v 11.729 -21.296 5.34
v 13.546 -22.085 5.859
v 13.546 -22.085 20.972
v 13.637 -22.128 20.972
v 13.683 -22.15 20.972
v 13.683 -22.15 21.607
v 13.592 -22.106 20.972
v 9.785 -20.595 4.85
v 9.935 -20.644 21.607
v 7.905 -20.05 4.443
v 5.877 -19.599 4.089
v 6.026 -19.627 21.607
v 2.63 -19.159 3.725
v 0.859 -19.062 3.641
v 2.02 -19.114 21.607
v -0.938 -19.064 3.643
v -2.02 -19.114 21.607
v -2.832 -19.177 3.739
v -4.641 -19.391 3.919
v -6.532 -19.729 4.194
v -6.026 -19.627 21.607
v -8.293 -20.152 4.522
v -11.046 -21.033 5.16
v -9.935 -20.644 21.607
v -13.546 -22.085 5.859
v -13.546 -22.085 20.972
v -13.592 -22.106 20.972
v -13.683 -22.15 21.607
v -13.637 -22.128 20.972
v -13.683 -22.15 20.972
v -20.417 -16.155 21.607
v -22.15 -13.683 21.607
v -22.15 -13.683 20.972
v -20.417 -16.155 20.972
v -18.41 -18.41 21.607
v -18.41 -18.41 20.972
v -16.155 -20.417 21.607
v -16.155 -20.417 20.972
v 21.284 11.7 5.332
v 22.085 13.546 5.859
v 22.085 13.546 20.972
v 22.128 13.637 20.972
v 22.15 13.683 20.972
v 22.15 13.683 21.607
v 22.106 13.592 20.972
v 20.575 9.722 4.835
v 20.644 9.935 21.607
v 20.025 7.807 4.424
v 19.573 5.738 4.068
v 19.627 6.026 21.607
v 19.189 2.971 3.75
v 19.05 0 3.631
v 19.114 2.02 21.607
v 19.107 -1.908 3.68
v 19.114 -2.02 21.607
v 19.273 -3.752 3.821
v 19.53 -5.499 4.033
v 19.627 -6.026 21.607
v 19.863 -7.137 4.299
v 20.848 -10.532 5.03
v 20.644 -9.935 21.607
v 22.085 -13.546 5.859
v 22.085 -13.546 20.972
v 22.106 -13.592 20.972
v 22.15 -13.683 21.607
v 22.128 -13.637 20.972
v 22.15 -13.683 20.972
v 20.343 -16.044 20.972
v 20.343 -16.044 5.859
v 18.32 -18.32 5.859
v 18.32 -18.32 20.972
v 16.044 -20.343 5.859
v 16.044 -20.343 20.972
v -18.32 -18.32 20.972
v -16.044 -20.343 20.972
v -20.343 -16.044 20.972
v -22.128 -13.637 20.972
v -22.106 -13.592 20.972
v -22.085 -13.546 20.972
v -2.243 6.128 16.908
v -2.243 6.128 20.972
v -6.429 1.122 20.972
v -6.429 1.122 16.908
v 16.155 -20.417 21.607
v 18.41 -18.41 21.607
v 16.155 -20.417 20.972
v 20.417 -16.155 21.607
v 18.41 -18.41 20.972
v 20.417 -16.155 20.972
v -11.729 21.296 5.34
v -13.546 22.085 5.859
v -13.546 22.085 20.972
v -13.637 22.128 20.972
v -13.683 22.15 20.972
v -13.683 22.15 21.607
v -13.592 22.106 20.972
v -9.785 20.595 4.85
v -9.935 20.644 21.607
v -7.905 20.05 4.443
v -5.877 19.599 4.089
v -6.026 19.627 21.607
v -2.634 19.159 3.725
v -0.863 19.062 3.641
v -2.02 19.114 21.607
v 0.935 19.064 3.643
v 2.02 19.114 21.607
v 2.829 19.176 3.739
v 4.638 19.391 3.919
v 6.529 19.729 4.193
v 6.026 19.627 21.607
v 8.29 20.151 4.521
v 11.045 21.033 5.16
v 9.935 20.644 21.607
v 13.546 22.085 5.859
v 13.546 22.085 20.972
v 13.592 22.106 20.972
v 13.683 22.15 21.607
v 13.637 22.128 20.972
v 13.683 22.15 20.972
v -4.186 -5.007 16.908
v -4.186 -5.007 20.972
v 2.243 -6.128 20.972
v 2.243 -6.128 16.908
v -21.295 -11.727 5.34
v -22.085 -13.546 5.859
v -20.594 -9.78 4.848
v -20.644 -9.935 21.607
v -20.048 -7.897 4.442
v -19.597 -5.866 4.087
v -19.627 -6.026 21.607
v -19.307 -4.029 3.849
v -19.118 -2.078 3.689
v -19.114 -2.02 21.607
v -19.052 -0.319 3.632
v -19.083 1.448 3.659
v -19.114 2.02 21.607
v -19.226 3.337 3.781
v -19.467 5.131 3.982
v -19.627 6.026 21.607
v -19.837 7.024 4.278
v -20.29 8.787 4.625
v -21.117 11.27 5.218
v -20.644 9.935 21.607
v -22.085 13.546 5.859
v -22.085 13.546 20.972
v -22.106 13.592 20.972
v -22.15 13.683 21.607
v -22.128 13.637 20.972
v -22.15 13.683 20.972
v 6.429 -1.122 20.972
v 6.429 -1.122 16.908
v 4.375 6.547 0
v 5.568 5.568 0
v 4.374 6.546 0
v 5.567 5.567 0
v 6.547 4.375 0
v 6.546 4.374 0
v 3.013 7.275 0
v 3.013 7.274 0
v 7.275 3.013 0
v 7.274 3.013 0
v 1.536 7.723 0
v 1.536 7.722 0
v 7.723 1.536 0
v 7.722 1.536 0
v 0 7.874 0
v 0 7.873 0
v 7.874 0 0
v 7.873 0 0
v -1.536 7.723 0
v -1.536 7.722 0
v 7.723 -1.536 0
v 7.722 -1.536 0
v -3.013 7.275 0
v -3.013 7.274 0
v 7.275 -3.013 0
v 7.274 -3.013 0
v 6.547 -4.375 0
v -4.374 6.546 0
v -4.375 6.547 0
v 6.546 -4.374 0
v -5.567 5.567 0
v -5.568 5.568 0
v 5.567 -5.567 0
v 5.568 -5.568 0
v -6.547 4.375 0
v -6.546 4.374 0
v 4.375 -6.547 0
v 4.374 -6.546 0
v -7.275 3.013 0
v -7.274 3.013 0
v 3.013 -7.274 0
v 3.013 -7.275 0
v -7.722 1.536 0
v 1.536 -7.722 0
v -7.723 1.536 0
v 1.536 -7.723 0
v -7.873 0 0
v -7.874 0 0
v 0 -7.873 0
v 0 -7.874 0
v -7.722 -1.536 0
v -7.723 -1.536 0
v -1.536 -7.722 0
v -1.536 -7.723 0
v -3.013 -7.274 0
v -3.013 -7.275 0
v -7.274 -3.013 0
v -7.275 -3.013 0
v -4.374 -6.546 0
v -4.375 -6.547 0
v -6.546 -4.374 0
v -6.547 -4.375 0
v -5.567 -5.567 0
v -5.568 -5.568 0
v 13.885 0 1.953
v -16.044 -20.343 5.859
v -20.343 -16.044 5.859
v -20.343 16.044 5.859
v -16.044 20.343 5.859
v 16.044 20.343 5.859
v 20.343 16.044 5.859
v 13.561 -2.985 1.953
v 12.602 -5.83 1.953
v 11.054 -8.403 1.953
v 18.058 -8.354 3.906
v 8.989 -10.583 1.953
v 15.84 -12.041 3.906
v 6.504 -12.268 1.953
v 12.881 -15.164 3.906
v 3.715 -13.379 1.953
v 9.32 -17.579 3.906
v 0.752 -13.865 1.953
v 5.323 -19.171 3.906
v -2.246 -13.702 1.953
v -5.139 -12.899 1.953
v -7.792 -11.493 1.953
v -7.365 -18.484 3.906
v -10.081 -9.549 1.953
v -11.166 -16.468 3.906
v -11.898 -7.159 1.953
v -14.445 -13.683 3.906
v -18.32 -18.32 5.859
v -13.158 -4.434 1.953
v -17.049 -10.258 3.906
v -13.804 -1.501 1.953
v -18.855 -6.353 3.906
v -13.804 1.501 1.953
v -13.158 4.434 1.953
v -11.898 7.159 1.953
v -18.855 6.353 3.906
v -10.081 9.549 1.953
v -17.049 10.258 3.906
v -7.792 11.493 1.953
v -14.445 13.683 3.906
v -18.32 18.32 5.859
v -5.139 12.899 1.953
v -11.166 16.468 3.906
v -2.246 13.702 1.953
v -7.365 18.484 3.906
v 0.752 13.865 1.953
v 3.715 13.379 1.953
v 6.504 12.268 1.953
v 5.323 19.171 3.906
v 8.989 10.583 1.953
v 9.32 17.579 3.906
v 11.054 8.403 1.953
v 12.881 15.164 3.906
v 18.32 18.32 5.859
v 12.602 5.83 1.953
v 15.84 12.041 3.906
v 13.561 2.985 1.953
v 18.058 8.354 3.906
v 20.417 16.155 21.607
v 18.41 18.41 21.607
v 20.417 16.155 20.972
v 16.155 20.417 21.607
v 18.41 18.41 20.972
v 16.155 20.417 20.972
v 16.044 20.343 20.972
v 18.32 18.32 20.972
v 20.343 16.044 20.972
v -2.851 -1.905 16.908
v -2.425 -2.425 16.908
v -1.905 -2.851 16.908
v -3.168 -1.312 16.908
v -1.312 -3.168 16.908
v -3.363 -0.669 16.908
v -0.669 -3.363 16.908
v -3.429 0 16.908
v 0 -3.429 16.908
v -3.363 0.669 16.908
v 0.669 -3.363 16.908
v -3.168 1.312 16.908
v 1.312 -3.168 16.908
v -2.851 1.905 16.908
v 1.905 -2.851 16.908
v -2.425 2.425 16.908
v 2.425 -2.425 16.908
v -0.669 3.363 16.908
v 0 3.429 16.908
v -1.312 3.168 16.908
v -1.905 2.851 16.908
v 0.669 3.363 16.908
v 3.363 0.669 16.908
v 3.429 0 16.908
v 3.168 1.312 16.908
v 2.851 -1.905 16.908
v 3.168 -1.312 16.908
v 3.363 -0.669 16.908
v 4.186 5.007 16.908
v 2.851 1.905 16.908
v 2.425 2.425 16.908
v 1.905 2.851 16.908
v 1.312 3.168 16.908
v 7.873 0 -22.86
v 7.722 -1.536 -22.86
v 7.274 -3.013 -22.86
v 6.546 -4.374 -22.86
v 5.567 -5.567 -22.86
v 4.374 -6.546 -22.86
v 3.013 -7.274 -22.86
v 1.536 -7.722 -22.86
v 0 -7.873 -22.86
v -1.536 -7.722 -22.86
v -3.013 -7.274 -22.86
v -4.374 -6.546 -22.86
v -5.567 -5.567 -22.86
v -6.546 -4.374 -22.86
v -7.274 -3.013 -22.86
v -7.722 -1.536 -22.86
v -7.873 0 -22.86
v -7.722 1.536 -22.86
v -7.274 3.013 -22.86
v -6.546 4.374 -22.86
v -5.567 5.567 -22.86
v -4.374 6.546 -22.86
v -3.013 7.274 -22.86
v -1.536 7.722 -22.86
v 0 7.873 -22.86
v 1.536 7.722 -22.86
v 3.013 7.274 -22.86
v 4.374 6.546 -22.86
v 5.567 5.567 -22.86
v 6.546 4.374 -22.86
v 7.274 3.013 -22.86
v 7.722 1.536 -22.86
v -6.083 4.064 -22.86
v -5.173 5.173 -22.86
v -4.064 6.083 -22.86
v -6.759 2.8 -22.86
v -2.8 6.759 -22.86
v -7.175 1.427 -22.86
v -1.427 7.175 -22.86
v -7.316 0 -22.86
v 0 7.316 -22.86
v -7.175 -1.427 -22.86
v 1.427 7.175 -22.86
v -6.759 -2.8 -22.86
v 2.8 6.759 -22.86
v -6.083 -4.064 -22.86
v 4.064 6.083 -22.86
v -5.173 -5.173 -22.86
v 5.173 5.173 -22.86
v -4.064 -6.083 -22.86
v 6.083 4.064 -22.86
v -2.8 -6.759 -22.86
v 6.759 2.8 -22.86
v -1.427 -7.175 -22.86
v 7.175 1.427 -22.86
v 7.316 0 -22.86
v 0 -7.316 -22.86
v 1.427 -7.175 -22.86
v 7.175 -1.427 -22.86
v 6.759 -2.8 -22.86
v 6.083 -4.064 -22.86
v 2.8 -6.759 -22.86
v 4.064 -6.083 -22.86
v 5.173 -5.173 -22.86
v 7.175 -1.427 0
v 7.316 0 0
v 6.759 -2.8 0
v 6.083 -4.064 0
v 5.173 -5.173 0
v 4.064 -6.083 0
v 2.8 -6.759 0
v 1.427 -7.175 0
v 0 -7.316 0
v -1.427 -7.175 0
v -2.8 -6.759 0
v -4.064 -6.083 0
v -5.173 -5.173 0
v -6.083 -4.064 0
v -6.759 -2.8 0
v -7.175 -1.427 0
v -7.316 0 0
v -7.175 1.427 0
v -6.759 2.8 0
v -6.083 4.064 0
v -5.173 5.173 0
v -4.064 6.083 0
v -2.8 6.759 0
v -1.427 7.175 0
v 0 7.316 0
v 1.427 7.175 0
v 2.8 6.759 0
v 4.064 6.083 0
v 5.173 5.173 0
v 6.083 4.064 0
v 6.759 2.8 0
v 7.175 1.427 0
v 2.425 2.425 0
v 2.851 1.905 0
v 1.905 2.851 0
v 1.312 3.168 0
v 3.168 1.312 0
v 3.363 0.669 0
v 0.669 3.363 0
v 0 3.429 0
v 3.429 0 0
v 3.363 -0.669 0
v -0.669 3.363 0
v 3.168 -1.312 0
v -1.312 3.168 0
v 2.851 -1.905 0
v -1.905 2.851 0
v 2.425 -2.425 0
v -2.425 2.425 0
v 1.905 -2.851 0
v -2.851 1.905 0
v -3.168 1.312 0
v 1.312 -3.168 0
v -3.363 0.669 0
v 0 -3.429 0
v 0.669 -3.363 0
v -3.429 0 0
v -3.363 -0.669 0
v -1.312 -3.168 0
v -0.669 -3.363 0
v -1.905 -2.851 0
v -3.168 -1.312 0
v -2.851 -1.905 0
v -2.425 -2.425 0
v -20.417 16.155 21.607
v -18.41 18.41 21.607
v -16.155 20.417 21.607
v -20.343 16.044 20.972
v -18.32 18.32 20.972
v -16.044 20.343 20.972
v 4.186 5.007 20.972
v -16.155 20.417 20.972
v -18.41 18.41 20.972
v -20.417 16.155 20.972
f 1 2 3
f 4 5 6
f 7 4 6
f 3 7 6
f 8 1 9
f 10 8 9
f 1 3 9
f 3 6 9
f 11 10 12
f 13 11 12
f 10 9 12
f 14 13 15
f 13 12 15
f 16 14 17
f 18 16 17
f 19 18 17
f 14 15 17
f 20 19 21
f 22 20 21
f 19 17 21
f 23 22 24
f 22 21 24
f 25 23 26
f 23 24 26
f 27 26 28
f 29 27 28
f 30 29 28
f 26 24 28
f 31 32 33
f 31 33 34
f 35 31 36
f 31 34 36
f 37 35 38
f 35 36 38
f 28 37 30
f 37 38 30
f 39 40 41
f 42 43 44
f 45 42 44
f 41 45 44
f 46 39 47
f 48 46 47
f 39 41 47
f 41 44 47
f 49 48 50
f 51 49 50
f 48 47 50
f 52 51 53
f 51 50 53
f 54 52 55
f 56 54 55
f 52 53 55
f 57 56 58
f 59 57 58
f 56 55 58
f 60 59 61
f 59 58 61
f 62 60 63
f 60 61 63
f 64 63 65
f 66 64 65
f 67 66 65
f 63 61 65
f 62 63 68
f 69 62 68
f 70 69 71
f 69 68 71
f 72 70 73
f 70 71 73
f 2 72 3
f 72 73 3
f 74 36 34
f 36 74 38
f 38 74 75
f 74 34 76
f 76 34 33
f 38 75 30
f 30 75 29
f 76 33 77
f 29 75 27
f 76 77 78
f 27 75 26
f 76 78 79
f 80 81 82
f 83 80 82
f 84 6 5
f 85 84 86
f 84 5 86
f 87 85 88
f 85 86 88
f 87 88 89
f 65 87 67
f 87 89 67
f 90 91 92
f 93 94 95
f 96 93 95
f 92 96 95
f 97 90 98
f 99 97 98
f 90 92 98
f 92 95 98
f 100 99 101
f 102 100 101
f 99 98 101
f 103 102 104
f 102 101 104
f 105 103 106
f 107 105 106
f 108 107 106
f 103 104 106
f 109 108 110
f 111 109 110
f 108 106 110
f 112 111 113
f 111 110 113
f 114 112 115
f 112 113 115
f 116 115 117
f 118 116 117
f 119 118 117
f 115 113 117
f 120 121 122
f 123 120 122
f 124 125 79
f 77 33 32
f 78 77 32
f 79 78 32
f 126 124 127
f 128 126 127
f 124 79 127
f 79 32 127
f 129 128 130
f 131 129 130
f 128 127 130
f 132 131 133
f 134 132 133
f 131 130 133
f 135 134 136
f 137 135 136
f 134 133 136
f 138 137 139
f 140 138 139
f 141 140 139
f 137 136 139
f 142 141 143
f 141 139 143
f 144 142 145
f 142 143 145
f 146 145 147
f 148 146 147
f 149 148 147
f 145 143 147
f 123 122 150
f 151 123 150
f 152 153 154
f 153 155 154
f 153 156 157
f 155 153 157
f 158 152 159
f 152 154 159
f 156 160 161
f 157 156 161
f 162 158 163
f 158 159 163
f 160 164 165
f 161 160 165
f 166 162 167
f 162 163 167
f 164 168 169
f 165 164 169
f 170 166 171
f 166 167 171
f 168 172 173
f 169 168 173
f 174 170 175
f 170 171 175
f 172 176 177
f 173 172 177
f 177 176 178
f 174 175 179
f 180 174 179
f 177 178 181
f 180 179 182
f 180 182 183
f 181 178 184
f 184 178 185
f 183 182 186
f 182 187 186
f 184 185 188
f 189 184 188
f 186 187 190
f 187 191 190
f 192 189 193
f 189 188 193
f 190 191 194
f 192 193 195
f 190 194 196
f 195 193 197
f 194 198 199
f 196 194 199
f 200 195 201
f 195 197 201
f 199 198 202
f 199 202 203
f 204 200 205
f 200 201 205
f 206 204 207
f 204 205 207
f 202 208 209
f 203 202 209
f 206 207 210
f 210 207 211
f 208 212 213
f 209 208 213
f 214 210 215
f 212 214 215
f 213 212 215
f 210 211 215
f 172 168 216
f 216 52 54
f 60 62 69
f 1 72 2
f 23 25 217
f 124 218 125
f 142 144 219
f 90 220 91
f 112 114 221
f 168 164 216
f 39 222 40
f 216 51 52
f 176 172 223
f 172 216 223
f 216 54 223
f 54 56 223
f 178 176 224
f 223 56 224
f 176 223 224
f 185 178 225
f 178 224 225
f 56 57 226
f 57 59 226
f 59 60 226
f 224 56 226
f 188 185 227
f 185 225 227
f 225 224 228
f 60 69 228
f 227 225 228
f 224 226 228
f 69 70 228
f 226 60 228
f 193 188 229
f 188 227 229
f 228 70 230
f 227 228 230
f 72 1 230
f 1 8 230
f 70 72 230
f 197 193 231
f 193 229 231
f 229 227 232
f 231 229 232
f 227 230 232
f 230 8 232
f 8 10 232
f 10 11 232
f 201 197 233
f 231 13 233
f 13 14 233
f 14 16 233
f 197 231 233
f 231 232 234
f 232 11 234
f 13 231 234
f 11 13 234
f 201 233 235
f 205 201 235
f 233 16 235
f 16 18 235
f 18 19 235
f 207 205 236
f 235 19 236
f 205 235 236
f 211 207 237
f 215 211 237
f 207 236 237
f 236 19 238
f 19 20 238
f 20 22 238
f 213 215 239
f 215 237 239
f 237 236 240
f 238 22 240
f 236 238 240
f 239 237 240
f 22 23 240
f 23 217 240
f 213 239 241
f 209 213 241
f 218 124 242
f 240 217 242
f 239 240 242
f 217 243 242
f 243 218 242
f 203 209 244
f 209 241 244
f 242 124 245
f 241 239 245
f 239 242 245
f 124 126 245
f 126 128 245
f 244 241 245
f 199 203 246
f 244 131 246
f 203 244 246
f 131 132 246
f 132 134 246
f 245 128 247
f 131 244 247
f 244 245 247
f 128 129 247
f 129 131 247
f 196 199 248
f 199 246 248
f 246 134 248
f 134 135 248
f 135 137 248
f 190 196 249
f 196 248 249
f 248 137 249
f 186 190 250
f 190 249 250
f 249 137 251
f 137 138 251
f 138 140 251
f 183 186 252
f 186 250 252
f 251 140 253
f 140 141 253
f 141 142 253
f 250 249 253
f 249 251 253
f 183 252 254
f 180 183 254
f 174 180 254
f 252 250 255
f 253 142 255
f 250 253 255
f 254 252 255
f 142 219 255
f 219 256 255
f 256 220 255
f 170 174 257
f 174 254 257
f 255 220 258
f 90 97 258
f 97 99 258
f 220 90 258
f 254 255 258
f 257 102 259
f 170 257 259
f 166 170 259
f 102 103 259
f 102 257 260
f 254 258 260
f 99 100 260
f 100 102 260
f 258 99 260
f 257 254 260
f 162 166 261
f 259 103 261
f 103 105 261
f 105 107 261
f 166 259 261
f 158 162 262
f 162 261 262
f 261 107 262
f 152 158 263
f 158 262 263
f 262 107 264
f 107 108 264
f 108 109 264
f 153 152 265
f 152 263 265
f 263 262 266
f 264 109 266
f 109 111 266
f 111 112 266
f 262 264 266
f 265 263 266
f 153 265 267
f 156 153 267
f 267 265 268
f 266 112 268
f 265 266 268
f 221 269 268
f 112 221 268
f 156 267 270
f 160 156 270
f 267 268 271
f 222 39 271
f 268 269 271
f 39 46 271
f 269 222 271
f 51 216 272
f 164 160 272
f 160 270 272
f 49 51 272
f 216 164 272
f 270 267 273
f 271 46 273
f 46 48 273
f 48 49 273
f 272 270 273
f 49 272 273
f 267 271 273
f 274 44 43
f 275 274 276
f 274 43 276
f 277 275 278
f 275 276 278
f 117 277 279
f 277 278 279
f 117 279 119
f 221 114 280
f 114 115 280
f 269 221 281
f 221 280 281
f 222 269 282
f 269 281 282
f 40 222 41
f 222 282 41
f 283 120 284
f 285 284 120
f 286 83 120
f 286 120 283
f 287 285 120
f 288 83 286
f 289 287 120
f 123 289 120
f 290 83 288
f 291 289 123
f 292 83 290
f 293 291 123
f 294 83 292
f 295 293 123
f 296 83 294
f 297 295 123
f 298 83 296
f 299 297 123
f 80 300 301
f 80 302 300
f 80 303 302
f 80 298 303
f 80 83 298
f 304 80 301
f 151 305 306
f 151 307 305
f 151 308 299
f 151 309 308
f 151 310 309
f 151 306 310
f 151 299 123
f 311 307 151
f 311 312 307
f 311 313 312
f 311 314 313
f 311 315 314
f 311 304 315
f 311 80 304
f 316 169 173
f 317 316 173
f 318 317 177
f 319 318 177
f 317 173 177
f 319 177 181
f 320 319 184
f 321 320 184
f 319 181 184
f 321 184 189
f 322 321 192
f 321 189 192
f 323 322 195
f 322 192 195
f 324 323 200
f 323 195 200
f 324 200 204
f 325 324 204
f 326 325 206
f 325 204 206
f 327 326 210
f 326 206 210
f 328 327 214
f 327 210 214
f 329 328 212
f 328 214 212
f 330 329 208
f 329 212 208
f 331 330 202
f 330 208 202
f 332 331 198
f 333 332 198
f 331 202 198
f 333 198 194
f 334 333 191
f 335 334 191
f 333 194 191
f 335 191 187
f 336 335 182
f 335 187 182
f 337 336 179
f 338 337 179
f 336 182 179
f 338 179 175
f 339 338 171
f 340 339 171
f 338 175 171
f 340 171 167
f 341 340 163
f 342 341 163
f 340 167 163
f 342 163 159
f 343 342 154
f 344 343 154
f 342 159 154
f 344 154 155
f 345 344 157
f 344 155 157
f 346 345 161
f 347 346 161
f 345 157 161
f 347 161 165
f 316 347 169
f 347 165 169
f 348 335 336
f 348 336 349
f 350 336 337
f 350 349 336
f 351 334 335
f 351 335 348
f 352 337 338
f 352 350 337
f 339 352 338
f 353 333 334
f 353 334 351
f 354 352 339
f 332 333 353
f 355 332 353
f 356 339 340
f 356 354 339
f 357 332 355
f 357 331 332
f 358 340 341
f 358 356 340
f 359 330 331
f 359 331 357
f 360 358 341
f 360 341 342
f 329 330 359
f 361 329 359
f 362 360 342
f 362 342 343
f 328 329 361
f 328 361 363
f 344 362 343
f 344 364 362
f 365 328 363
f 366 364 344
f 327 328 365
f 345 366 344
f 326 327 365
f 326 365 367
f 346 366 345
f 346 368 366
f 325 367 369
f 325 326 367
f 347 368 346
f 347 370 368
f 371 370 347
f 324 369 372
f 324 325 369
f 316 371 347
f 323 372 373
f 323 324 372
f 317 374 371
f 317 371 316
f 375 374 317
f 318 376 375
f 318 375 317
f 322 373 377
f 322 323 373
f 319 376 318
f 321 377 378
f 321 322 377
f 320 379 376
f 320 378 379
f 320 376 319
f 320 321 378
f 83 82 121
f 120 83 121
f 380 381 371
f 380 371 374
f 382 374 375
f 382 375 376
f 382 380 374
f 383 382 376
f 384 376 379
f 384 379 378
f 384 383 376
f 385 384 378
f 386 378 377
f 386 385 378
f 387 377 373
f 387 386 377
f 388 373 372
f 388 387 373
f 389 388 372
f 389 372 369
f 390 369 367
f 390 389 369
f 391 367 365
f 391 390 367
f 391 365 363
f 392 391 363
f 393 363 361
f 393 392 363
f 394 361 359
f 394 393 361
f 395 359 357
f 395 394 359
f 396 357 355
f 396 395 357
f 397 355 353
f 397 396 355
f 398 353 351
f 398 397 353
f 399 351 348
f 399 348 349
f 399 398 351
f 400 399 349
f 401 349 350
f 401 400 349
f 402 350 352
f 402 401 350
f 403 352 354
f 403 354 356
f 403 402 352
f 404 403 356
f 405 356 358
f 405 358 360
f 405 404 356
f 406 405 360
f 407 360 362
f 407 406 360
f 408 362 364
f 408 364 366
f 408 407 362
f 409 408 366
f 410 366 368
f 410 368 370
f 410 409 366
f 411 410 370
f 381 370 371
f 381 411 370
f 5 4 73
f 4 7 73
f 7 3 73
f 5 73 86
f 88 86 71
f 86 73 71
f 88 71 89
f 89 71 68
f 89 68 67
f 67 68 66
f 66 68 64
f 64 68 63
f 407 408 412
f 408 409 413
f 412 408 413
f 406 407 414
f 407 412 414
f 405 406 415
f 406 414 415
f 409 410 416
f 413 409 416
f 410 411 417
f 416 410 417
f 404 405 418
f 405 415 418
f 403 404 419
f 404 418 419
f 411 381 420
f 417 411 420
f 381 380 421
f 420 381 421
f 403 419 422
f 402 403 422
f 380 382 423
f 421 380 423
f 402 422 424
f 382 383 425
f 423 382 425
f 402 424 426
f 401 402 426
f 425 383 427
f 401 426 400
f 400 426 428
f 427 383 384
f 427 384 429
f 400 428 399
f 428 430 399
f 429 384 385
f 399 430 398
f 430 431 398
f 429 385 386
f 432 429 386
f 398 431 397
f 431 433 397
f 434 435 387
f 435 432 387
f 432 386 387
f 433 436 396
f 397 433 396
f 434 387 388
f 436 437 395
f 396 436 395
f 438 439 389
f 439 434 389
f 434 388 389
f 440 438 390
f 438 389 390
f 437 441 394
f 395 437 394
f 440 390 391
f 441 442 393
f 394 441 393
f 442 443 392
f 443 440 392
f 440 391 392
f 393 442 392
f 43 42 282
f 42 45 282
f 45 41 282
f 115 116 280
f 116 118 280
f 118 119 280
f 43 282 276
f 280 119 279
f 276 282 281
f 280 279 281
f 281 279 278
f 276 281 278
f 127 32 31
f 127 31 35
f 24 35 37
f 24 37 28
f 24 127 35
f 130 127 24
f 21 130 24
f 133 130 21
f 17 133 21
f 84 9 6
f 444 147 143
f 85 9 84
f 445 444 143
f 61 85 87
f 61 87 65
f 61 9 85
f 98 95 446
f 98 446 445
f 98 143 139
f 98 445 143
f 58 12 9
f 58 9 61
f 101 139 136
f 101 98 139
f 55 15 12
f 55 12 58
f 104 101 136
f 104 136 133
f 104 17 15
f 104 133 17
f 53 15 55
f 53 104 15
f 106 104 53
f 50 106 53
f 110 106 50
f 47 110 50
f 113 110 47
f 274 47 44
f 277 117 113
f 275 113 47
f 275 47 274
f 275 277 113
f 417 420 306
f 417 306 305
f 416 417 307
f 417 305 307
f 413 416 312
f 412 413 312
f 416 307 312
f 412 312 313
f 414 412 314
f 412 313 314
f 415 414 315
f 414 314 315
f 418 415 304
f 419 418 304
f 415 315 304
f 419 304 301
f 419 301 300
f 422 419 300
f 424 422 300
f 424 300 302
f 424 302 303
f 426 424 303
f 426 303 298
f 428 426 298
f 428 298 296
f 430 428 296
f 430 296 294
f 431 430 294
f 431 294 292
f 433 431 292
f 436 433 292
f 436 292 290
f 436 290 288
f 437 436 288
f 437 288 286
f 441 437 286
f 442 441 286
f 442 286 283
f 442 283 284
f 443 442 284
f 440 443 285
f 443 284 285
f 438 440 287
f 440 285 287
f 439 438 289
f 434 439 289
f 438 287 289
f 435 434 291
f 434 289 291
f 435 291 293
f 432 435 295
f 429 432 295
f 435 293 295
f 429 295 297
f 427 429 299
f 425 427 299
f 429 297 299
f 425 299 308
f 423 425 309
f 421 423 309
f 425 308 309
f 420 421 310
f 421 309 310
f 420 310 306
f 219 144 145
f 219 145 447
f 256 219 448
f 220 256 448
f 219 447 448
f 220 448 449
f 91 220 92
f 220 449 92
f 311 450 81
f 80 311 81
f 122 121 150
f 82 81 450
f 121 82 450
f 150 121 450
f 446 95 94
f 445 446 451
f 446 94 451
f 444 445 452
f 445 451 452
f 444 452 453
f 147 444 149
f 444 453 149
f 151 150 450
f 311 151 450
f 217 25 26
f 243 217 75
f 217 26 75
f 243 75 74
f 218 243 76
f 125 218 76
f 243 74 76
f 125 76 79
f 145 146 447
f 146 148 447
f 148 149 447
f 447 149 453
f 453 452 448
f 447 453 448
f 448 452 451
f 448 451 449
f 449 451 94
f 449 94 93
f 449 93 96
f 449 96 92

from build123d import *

# Parameters (mm, degrees)
F2_R      = 26.134352
F3_DEPTH  = 0.635
F5_DEPTH  = 4.064
F6_R      = 3.429
F7_DEPTH  = 25.4
F8_R      = 26.035
F9_DEPTH  = 0.635
F10_R     = 7.873192
F10_R_2   = 7.315587
F11_DEPTH = 22.86
F12_R     = 31.75
F13_DEPTH = 25.4


with BuildPart() as f1:
    # F0 (on Front) → F1 (revolve)
    with BuildSketch(Plane.XZ):
        Polygon((0, 21.606712), (0, 0), (7.874, 0), (25.908, 5.858712), (25.908, 21.606712), align=None)
    revolve(axis=Axis((0, 0, 10.803356), (0, 0, -1)))

    # F2 (on face) → F3 (cut)
    with BuildSketch(Plane.XY.offset(21.606712)):
        Circle(F2_R)
    extrude(amount=-F3_DEPTH, mode=Mode.SUBTRACT)

    # F4 (on face) → F5 (cut)
    with BuildSketch(Plane.XY.offset(20.971712)):
        Polygon((2.242883, -6.128247), (6.428659, -1.12173), (4.185776, 5.006517), (-2.242883, 6.128247), (-6.428659, 1.12173), (-4.185776, -5.006517), align=None)
    extrude(amount=-F5_DEPTH, mode=Mode.SUBTRACT)

    # F6 (on face) → F7 (cut)
    with BuildSketch(Plane.XY.offset(16.907712)):
        Circle(F6_R)
    extrude(amount=-F7_DEPTH, mode=Mode.SUBTRACT)

    # F8 (on face) → F9 (join)
    with BuildSketch(Plane.XY.offset(20.971712)):
        Circle(F8_R)
    extrude(amount=F9_DEPTH)

    # F10 (on face) → F11 (join)
    with BuildSketch(Plane(origin=(0, 0, 0), x_dir=(1, 0, 0), z_dir=(0, 0, -1))):
        Circle(F10_R)
        Circle(F10_R_2, mode=Mode.SUBTRACT)
    extrude(amount=F11_DEPTH)

    # F12 (on face) → F13 (cut)
    with BuildSketch(Plane.XY.offset(21.606712)):
        with Locations((-50.8, 0)):
            Circle(F12_R)
        with Locations((0, 50.8)):
            Circle(F12_R)
        with Locations((50.8, 0)):
            Circle(F12_R)
        with Locations((0, -50.8)):
            Circle(F12_R)
    extrude(amount=-F13_DEPTH, mode=Mode.SUBTRACT)


solid = f1.part
